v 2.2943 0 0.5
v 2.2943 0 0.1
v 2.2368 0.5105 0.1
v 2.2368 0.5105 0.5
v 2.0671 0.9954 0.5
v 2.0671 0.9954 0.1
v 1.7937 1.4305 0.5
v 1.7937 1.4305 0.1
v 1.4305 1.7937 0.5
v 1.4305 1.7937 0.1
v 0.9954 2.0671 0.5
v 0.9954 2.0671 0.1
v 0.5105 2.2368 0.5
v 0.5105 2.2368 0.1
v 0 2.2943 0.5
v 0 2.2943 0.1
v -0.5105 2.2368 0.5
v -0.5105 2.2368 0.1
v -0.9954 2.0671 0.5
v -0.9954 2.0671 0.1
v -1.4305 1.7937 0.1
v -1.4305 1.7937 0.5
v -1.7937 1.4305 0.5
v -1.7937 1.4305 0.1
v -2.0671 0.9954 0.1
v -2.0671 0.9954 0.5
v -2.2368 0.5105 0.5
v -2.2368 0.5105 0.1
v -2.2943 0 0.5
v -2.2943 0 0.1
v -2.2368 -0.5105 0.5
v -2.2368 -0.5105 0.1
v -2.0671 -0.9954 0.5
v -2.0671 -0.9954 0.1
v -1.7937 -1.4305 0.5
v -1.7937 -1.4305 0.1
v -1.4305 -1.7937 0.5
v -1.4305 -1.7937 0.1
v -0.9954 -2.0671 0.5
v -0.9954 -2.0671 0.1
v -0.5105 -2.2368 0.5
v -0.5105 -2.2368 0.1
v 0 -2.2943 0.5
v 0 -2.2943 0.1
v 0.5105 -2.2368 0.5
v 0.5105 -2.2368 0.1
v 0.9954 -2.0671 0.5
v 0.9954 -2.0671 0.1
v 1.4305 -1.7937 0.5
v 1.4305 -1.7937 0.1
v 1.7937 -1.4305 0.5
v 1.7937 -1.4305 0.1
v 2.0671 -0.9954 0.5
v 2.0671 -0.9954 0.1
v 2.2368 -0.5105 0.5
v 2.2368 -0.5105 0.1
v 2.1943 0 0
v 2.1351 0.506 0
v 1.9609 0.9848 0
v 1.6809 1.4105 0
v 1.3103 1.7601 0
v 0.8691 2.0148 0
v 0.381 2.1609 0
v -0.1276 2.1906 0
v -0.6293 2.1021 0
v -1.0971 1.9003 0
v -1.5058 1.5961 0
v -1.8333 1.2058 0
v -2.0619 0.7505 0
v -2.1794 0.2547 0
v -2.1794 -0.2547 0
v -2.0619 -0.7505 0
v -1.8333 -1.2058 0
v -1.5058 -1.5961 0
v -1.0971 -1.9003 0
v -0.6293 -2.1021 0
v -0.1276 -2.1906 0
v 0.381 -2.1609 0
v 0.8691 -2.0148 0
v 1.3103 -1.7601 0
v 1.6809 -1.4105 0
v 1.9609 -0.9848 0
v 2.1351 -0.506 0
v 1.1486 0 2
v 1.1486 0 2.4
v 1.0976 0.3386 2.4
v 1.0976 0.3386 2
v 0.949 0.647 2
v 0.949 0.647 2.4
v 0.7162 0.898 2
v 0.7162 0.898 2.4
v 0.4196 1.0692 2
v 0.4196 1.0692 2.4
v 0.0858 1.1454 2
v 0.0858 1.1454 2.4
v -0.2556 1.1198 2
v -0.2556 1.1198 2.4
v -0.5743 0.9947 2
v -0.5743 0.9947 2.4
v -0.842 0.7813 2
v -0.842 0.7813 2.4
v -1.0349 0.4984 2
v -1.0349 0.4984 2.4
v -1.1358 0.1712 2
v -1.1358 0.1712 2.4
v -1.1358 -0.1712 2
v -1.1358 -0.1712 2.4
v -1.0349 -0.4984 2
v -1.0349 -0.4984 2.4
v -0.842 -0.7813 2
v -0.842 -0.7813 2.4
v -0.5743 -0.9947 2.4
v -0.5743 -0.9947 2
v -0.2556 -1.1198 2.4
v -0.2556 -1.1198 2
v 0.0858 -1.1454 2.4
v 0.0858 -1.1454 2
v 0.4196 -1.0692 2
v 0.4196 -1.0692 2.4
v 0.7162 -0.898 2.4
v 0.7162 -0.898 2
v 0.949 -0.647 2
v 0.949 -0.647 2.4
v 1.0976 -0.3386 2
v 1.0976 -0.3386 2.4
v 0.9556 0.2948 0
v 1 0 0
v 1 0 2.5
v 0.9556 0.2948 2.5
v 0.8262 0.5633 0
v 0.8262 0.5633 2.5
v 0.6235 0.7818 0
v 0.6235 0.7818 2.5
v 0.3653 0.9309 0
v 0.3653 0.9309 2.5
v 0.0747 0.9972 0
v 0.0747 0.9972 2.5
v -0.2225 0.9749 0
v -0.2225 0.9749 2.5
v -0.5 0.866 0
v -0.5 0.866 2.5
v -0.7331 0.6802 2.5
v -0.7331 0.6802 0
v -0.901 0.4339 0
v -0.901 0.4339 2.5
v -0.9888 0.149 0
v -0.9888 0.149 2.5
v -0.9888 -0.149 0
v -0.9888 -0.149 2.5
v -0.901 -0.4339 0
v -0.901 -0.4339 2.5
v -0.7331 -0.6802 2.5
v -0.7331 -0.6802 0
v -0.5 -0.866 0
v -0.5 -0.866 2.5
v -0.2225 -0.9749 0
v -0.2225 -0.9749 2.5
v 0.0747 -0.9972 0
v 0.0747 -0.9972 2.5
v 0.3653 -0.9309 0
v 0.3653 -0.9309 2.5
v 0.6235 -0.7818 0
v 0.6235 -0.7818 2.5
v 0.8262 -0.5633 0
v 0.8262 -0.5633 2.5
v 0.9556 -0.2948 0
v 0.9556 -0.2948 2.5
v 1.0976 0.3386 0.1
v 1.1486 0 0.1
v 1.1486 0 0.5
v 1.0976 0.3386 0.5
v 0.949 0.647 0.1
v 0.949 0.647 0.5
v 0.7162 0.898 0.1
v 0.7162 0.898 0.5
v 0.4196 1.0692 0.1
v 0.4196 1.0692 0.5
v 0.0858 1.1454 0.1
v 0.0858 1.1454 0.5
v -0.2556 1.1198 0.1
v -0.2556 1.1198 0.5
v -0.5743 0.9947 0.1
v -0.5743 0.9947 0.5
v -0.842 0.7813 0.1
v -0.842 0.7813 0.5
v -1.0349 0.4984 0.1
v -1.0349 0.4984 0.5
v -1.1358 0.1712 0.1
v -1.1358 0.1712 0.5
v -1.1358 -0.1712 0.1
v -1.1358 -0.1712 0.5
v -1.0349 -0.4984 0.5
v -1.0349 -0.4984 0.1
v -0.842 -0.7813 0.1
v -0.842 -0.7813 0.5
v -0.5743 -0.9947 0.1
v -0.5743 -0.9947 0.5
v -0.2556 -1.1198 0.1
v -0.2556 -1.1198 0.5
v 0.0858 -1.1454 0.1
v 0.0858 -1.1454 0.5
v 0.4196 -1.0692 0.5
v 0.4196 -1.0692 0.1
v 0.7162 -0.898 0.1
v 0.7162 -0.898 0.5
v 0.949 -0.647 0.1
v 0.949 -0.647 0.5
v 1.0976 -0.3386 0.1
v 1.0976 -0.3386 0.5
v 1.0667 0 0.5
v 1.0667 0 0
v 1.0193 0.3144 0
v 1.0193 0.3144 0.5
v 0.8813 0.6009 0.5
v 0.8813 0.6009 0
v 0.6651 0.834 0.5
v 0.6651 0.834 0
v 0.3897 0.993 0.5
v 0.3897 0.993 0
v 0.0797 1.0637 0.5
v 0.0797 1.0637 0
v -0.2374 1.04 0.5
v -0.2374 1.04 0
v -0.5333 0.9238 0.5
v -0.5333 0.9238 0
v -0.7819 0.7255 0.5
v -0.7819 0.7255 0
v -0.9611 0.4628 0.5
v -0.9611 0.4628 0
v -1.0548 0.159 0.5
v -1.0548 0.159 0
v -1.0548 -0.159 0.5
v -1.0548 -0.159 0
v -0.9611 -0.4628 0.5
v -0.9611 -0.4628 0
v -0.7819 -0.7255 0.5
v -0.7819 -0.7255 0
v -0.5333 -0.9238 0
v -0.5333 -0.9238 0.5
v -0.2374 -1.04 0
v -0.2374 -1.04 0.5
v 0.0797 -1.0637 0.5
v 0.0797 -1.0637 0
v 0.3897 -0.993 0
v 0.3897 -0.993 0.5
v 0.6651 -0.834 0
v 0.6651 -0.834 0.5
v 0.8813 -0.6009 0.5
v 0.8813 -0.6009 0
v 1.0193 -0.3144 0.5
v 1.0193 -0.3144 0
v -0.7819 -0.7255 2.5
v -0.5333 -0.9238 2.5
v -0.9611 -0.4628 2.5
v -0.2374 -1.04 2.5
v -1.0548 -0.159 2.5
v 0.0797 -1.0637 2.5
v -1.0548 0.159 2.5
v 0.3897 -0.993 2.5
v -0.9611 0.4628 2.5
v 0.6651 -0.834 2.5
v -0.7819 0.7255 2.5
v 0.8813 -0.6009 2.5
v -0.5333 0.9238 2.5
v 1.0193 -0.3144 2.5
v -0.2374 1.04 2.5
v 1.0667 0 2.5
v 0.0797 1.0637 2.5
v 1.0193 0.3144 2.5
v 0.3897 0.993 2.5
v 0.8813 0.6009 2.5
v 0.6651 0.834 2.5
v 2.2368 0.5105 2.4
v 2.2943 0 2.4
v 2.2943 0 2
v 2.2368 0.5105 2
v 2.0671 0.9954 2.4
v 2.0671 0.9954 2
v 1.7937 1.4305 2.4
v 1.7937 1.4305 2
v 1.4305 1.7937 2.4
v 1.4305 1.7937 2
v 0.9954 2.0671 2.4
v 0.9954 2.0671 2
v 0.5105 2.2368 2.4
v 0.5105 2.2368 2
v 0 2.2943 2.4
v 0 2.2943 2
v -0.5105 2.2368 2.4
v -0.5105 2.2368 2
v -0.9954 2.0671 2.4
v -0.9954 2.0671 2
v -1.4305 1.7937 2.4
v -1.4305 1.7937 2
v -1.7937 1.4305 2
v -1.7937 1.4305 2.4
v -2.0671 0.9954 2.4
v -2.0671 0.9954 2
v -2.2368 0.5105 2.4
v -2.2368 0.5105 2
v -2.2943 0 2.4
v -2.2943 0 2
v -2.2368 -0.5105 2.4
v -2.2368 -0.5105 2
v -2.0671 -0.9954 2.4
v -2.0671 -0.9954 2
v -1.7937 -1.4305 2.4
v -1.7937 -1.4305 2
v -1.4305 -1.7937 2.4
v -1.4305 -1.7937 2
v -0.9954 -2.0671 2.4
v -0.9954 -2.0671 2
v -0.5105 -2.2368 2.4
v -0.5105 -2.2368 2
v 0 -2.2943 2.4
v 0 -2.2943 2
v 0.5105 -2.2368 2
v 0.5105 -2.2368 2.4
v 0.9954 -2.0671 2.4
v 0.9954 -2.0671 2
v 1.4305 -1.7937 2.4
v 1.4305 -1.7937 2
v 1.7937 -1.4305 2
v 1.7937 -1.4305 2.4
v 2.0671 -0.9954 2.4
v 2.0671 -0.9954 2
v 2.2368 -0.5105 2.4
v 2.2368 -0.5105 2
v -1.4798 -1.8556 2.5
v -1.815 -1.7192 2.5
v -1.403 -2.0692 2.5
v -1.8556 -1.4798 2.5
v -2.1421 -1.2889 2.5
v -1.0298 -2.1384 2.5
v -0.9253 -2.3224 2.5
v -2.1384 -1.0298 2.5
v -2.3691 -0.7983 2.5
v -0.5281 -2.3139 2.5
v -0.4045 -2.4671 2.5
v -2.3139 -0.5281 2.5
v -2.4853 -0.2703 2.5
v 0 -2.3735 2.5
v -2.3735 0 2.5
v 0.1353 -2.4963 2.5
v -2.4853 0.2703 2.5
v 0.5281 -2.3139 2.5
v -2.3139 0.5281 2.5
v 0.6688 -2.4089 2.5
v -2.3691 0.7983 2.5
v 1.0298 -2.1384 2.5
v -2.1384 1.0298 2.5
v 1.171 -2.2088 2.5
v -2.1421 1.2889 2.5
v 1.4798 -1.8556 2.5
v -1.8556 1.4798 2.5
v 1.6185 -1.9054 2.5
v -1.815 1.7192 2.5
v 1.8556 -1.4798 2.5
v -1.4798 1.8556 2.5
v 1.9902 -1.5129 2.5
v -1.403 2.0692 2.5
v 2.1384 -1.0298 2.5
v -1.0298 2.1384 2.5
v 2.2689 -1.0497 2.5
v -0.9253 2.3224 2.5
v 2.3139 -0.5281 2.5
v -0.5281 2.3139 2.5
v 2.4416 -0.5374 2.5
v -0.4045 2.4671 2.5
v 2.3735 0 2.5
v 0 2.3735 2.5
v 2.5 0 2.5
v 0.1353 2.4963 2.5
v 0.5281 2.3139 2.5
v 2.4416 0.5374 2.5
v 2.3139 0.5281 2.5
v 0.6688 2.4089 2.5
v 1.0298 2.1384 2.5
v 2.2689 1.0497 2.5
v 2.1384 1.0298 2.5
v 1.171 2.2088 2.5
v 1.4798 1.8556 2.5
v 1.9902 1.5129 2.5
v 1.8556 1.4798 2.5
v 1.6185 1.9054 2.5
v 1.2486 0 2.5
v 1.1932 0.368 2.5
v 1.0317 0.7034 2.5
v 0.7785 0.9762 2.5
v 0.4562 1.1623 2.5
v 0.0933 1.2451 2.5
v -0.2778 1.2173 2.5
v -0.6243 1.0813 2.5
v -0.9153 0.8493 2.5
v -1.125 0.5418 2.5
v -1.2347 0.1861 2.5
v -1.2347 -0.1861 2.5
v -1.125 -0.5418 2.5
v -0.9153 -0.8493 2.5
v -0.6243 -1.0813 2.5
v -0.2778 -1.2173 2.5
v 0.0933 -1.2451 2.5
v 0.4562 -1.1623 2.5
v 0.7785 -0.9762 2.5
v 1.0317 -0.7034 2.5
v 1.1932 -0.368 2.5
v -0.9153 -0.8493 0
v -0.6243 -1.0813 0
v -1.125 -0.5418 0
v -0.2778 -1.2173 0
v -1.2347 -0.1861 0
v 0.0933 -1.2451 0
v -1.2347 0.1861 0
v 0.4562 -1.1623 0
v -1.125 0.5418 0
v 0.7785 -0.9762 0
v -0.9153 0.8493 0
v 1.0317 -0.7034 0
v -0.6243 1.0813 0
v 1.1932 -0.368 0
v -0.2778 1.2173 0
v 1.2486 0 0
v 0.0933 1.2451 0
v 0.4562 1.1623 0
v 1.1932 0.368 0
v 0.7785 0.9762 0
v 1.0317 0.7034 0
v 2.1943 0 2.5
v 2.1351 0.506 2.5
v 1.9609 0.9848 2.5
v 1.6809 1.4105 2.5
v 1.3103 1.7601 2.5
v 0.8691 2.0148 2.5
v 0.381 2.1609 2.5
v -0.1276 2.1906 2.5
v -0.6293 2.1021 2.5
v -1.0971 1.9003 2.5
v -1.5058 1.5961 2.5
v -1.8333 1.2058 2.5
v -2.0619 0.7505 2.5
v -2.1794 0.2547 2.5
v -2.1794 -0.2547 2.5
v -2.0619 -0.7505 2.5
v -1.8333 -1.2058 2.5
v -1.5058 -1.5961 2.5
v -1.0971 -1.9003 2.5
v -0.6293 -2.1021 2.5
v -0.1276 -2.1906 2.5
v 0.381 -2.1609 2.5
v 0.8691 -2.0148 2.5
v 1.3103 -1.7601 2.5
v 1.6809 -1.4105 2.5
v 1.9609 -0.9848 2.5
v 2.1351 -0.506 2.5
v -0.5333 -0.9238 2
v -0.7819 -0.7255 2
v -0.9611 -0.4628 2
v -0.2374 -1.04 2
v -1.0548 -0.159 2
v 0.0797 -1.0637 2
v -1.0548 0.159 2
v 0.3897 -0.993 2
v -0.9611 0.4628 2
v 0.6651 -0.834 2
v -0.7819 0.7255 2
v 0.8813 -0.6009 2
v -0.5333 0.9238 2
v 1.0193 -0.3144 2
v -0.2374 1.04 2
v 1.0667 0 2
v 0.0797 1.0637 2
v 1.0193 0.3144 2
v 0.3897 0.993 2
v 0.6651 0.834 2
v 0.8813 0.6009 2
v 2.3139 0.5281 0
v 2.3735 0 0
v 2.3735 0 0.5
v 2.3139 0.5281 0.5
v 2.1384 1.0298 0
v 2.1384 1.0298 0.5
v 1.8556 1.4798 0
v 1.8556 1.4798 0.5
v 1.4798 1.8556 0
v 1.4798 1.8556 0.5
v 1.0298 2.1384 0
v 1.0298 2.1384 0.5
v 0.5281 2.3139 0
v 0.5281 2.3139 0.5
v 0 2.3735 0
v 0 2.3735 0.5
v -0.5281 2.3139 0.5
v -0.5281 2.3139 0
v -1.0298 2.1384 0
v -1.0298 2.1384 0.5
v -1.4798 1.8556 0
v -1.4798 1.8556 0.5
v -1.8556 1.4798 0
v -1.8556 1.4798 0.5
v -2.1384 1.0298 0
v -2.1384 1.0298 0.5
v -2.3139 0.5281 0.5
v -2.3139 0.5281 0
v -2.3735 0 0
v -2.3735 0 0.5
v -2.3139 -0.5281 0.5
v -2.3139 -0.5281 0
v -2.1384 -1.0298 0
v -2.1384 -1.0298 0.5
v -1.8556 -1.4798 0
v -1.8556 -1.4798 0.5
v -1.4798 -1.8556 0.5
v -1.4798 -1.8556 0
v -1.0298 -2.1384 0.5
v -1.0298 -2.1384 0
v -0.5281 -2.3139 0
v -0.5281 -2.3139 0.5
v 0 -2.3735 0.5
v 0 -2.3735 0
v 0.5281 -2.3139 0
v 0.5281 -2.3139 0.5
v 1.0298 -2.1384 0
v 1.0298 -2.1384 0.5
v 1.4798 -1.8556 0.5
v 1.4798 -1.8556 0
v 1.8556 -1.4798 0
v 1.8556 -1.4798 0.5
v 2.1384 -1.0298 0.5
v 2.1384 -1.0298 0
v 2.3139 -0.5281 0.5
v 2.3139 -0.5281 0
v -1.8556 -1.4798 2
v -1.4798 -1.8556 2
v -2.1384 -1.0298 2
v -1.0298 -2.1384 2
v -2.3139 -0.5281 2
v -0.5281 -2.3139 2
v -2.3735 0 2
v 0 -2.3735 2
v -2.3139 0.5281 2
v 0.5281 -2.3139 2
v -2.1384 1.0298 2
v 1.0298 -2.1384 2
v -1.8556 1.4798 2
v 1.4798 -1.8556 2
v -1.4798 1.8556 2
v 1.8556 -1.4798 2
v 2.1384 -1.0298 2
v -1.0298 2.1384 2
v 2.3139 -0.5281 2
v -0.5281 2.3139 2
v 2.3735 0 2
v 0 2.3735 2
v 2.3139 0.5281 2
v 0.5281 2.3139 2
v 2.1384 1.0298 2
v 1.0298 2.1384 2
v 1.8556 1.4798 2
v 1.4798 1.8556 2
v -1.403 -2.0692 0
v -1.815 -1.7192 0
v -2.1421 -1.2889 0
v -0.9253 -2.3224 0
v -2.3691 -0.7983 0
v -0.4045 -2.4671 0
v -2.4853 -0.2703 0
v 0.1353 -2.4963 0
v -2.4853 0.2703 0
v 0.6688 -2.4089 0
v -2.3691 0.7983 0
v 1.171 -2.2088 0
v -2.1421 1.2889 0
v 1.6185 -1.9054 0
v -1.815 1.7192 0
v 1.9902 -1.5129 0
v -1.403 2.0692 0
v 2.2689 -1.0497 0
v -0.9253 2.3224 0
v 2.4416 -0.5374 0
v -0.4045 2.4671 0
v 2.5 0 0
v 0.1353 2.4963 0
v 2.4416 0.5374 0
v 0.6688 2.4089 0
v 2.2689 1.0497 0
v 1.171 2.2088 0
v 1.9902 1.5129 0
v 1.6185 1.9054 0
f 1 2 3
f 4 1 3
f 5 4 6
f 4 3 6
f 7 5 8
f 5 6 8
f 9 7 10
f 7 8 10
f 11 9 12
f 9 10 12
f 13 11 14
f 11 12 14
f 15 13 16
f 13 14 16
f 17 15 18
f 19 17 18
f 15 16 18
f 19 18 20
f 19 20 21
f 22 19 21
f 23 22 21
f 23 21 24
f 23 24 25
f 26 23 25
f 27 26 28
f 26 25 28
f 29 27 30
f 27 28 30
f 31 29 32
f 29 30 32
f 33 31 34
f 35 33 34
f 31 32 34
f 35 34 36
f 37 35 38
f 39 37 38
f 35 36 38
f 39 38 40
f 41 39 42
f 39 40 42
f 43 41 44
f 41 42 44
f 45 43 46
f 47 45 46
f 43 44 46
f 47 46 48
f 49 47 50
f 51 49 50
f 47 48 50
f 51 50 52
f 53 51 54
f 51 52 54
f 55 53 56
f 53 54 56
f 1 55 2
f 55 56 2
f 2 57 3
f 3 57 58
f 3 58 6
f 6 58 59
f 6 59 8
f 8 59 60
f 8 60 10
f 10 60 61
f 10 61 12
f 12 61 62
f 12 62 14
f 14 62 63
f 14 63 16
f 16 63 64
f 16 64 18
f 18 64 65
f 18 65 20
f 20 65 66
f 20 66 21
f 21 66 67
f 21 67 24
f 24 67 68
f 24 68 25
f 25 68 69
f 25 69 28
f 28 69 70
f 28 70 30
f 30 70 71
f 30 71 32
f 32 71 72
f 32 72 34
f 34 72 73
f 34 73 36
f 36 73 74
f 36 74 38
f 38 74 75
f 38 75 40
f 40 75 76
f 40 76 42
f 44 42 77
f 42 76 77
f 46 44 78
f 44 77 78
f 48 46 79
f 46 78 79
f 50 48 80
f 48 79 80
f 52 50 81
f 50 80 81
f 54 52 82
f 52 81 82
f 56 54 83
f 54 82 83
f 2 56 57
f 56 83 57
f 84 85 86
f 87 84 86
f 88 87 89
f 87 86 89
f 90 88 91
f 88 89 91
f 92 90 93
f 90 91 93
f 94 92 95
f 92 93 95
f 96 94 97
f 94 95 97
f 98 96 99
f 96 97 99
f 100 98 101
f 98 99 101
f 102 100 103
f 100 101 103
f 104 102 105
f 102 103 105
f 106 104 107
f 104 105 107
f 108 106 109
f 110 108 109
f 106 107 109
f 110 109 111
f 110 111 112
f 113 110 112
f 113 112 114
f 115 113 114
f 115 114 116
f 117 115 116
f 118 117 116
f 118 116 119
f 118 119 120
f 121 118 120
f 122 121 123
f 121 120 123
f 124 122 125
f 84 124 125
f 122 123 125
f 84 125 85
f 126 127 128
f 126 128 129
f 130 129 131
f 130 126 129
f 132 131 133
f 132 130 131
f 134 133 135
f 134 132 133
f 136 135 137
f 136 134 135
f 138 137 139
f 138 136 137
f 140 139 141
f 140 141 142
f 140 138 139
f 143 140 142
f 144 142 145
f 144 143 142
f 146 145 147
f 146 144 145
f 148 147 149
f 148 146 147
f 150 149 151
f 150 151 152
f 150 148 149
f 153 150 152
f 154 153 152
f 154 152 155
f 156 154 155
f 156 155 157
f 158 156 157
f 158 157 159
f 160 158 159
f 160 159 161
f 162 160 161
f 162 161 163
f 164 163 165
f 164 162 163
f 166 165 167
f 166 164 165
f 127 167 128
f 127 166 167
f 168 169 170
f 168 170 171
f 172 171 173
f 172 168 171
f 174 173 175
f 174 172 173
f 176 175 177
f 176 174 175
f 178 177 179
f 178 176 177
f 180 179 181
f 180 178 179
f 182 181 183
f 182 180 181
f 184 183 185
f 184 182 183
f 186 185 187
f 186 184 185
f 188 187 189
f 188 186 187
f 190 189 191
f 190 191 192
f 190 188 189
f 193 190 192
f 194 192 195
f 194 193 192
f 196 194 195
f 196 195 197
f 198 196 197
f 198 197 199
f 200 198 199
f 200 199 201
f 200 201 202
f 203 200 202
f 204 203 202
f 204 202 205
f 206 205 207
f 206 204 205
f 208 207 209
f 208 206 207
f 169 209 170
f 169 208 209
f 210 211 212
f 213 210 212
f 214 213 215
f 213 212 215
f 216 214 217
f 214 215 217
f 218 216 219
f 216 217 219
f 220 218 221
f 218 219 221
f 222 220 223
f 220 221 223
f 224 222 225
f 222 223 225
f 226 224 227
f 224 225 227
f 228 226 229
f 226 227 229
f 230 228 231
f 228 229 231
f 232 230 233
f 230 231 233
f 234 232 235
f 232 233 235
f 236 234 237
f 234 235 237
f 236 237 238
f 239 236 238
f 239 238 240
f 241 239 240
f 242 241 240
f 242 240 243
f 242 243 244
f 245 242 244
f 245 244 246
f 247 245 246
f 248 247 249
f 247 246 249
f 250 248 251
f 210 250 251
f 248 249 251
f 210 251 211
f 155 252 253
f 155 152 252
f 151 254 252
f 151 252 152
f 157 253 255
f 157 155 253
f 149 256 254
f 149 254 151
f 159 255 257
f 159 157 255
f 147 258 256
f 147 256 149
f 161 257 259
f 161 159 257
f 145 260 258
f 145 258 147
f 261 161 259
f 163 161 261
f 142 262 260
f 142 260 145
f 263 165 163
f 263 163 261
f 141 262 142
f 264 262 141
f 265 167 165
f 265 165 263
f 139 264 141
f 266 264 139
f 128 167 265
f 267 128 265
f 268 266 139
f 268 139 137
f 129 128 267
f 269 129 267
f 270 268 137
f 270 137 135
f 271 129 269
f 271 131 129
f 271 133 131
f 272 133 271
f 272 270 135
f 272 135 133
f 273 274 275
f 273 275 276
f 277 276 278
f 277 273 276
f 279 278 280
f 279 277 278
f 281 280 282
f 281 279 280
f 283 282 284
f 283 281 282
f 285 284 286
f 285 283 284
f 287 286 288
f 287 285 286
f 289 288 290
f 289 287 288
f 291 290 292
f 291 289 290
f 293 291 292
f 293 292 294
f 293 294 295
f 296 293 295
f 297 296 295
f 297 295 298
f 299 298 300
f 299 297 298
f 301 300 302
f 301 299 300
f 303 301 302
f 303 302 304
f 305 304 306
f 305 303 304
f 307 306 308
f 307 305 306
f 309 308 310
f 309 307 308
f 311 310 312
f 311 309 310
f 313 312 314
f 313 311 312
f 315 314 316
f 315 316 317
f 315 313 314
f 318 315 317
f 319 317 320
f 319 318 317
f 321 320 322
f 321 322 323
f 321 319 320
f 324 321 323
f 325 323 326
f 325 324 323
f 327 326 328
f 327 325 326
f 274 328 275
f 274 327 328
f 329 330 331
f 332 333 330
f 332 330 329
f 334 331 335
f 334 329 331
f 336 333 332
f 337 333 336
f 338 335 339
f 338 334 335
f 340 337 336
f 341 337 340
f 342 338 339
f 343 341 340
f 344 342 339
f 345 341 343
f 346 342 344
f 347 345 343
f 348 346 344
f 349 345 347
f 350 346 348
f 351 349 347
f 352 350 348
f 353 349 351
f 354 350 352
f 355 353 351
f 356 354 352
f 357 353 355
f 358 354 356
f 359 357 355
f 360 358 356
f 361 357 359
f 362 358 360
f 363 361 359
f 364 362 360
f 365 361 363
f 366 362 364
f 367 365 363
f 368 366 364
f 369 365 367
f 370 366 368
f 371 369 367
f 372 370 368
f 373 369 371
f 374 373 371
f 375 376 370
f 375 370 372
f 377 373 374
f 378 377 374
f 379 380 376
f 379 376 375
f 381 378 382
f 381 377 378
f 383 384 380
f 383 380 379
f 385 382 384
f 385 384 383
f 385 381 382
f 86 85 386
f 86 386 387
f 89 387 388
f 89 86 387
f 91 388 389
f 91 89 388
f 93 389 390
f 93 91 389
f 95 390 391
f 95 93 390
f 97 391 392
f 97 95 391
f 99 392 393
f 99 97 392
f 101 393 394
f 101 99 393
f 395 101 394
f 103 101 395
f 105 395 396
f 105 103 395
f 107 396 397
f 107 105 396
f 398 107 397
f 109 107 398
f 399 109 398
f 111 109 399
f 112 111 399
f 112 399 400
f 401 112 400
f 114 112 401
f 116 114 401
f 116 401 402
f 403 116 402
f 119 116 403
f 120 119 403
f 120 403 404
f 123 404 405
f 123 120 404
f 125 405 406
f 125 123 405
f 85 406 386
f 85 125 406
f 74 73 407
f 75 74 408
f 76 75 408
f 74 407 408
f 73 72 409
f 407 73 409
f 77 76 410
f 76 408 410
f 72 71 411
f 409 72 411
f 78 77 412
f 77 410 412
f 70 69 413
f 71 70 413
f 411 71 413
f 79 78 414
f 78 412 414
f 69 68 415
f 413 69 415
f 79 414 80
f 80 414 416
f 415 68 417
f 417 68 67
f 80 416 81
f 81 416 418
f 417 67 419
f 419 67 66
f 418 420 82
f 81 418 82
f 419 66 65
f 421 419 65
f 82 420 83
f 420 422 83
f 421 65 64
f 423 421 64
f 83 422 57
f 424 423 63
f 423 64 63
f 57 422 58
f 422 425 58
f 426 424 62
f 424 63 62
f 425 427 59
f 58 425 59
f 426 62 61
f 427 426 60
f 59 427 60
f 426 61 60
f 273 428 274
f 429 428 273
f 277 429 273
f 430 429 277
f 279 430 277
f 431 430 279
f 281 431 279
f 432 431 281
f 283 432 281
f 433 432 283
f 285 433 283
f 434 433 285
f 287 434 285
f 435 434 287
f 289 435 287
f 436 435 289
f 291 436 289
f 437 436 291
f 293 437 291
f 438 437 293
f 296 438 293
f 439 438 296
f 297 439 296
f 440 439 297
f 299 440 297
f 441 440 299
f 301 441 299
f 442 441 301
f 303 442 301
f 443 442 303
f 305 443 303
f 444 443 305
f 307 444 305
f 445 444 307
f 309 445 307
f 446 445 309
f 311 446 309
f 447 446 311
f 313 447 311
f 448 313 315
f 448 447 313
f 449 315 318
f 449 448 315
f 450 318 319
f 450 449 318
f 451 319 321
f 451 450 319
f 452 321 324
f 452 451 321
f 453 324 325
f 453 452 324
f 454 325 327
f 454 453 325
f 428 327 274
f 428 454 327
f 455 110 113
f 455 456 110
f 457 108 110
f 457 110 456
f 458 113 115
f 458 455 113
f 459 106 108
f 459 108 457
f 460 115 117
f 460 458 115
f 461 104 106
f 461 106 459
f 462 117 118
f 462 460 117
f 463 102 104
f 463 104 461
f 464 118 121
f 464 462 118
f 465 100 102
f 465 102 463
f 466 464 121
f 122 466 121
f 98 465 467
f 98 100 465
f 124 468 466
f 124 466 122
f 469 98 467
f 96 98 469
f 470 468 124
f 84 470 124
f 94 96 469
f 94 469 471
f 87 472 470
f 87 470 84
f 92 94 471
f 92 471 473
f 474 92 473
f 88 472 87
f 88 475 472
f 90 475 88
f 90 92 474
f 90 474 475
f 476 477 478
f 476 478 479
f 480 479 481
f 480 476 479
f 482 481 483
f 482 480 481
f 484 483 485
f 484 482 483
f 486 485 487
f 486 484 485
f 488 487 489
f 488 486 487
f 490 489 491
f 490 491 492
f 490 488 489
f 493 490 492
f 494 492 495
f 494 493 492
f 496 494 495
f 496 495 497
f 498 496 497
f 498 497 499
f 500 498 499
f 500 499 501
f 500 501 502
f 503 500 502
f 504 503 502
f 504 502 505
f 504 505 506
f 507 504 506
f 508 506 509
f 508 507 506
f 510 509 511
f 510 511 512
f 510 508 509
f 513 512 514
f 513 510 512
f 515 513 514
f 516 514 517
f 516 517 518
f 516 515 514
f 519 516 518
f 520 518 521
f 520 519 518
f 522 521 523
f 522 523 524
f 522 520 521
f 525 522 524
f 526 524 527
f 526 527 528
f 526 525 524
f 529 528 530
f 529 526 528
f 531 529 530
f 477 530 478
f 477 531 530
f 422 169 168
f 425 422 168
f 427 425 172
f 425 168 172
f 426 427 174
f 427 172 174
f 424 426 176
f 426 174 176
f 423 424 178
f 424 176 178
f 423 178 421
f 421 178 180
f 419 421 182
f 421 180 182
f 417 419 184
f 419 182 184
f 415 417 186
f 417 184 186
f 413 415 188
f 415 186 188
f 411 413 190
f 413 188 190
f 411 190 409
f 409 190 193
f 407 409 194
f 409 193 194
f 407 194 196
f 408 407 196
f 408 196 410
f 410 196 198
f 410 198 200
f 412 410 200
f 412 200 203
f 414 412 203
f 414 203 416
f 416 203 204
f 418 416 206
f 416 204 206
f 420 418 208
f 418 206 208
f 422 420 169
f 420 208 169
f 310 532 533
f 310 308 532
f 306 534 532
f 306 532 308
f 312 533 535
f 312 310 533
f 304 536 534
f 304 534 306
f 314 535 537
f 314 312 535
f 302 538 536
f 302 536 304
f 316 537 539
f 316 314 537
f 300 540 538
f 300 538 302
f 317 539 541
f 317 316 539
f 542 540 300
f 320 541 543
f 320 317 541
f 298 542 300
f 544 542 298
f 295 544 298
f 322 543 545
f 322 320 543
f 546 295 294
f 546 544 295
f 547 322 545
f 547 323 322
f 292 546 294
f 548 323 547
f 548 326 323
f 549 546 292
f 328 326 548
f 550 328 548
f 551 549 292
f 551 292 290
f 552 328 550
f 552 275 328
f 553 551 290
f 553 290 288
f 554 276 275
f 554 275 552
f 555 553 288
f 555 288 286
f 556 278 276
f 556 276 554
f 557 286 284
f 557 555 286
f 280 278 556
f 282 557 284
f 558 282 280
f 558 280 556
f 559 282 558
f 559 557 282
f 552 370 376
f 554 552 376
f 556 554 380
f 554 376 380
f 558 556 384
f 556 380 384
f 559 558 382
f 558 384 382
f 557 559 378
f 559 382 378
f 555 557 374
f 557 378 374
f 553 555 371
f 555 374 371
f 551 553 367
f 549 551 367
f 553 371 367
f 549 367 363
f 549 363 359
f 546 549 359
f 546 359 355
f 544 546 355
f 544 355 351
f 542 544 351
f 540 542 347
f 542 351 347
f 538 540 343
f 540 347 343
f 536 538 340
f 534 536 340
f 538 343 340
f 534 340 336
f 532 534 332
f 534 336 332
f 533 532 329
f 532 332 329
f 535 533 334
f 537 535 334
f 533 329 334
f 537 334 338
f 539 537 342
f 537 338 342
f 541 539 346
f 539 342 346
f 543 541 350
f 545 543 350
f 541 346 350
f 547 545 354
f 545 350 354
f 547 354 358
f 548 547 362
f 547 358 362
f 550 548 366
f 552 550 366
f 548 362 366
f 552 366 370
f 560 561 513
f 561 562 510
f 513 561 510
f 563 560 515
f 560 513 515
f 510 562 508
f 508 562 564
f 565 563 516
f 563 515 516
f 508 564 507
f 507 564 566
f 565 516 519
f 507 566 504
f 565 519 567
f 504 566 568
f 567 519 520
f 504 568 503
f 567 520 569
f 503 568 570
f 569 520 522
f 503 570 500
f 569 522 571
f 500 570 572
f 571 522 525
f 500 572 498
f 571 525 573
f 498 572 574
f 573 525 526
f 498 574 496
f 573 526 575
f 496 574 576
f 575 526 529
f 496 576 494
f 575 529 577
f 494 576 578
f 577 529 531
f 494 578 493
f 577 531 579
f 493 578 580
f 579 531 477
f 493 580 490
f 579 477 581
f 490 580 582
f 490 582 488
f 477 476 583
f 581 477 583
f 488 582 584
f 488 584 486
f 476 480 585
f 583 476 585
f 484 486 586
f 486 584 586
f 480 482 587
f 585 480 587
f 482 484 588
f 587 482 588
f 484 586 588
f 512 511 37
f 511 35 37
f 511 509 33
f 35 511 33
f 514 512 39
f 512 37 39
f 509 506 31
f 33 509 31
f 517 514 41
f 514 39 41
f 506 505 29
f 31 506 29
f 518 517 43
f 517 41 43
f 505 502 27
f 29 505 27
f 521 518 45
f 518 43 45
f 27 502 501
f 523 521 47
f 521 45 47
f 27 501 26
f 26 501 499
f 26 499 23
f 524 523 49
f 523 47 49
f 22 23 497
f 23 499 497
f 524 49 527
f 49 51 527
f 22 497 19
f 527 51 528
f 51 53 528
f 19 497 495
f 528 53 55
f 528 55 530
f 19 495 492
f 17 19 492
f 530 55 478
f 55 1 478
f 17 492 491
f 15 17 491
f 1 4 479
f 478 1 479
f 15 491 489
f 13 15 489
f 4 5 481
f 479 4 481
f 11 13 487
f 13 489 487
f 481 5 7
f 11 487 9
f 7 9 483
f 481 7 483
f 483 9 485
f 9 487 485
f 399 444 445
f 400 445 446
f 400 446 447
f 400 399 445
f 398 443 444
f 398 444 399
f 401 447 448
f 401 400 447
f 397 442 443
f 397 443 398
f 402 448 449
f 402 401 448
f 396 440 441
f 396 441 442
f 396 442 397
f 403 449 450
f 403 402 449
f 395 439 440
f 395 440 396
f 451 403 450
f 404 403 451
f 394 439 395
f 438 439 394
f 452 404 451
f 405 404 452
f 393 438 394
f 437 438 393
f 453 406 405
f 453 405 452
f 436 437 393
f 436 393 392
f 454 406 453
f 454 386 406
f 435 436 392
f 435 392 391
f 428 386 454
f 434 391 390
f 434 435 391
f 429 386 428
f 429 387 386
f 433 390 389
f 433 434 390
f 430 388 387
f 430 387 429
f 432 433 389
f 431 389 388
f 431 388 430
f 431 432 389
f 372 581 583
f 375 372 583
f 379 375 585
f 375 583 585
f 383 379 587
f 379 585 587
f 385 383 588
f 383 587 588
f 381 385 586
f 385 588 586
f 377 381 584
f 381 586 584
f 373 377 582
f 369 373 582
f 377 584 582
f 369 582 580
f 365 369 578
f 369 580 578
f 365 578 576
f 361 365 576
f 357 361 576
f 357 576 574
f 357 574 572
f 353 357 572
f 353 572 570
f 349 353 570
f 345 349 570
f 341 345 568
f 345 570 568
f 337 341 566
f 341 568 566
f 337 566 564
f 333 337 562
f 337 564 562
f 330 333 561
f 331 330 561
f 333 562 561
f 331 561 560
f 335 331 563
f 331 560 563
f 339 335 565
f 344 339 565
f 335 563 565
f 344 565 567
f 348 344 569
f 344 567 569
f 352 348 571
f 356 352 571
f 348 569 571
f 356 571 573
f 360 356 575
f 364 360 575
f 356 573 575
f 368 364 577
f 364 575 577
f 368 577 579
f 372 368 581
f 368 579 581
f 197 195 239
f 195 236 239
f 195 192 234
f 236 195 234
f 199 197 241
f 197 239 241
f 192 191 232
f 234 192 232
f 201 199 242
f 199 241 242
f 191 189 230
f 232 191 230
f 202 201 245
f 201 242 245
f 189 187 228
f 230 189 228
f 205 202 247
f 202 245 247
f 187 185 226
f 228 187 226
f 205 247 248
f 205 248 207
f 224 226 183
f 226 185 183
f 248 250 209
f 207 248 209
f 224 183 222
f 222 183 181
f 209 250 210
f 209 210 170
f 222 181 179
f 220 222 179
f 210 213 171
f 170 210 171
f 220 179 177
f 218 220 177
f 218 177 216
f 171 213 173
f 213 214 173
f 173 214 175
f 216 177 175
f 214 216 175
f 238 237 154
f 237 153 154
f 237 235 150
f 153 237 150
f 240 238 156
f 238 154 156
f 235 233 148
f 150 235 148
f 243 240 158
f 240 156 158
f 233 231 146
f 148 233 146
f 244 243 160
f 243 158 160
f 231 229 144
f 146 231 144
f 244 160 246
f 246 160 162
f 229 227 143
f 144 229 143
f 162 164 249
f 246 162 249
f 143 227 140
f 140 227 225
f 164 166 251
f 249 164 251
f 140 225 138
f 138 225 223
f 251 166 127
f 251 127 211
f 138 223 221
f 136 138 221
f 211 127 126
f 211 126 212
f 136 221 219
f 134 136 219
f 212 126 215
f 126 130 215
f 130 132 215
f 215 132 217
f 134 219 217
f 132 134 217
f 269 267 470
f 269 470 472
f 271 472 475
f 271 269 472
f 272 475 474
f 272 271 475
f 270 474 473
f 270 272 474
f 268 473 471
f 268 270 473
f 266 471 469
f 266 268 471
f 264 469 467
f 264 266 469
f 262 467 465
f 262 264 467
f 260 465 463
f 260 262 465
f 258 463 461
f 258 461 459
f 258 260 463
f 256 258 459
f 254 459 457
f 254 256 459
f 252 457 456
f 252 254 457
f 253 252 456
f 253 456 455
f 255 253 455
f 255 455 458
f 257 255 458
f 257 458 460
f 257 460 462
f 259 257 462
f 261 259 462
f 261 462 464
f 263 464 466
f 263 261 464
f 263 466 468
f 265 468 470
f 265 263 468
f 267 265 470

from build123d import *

# Parameters (mm, degrees)
SKETCH1_R           = 2.5
SKETCH1_R_2         = 1
BOSS_EXTRUDE1_DEPTH = 2.5
SKETCH2_R           = 2.373453331
SKETCH2_R_2         = 2.294274522
SKETCH2_R_3         = 1.148633929
SKETCH2_R_4         = 1.066697382
CUT_EXTRUDE1_DEPTH  = 0.5
CHAMFER1_SIZE       = 0.1
CHAMFER2_SIZE       = 0.1


with BuildPart() as part:
    # Sketch1 → Boss-Extrude1 (new body)
    with BuildSketch(Plane.XY):
        Circle(SKETCH1_R)
        Circle(SKETCH1_R_2, mode=Mode.SUBTRACT)
    extrude(amount=BOSS_EXTRUDE1_DEPTH)

    # Sketch2 → Cut-Extrude1 (cut)
    # profile 1 of 2: a face of its own
    with BuildSketch(Plane.XY.offset(2.5)):
        Circle(SKETCH2_R)
        Circle(SKETCH2_R_2, mode=Mode.SUBTRACT)
    # profile 2 of 2: a face of its own
    with BuildSketch(Plane.XY.offset(2.5)):
        Circle(SKETCH2_R_3)
        Circle(SKETCH2_R_4, mode=Mode.SUBTRACT)
    cut_extrude1 = extrude(amount=-CUT_EXTRUDE1_DEPTH, mode=Mode.SUBTRACT)

    # Chamfer1
    chamfer1_edges = [part.edges().sort_by_distance(p)[0] for p in [
        (-2.294274522, 0, 2.5),
        (-1.148633929, 0, 2.5),
    ]]
    chamfer(chamfer1_edges, length=CHAMFER1_SIZE)

    # Mirror3: Cut-Extrude1 across plane
    add(cut_extrude1.mirror(Plane(origin=(0, 0, 1.25), x_dir=(1, 0, 0), z_dir=(0, 0, -1))), mode=Mode.SUBTRACT)

    # Chamfer2
    chamfer2_edges = [part.edges().sort_by_distance(p)[0] for p in [
        (-2.294274522, 0, 0),
        (-1.148633929, 0, 0),
    ]]
    chamfer(chamfer2_edges, length=CHAMFER2_SIZE)


solid = part.part
